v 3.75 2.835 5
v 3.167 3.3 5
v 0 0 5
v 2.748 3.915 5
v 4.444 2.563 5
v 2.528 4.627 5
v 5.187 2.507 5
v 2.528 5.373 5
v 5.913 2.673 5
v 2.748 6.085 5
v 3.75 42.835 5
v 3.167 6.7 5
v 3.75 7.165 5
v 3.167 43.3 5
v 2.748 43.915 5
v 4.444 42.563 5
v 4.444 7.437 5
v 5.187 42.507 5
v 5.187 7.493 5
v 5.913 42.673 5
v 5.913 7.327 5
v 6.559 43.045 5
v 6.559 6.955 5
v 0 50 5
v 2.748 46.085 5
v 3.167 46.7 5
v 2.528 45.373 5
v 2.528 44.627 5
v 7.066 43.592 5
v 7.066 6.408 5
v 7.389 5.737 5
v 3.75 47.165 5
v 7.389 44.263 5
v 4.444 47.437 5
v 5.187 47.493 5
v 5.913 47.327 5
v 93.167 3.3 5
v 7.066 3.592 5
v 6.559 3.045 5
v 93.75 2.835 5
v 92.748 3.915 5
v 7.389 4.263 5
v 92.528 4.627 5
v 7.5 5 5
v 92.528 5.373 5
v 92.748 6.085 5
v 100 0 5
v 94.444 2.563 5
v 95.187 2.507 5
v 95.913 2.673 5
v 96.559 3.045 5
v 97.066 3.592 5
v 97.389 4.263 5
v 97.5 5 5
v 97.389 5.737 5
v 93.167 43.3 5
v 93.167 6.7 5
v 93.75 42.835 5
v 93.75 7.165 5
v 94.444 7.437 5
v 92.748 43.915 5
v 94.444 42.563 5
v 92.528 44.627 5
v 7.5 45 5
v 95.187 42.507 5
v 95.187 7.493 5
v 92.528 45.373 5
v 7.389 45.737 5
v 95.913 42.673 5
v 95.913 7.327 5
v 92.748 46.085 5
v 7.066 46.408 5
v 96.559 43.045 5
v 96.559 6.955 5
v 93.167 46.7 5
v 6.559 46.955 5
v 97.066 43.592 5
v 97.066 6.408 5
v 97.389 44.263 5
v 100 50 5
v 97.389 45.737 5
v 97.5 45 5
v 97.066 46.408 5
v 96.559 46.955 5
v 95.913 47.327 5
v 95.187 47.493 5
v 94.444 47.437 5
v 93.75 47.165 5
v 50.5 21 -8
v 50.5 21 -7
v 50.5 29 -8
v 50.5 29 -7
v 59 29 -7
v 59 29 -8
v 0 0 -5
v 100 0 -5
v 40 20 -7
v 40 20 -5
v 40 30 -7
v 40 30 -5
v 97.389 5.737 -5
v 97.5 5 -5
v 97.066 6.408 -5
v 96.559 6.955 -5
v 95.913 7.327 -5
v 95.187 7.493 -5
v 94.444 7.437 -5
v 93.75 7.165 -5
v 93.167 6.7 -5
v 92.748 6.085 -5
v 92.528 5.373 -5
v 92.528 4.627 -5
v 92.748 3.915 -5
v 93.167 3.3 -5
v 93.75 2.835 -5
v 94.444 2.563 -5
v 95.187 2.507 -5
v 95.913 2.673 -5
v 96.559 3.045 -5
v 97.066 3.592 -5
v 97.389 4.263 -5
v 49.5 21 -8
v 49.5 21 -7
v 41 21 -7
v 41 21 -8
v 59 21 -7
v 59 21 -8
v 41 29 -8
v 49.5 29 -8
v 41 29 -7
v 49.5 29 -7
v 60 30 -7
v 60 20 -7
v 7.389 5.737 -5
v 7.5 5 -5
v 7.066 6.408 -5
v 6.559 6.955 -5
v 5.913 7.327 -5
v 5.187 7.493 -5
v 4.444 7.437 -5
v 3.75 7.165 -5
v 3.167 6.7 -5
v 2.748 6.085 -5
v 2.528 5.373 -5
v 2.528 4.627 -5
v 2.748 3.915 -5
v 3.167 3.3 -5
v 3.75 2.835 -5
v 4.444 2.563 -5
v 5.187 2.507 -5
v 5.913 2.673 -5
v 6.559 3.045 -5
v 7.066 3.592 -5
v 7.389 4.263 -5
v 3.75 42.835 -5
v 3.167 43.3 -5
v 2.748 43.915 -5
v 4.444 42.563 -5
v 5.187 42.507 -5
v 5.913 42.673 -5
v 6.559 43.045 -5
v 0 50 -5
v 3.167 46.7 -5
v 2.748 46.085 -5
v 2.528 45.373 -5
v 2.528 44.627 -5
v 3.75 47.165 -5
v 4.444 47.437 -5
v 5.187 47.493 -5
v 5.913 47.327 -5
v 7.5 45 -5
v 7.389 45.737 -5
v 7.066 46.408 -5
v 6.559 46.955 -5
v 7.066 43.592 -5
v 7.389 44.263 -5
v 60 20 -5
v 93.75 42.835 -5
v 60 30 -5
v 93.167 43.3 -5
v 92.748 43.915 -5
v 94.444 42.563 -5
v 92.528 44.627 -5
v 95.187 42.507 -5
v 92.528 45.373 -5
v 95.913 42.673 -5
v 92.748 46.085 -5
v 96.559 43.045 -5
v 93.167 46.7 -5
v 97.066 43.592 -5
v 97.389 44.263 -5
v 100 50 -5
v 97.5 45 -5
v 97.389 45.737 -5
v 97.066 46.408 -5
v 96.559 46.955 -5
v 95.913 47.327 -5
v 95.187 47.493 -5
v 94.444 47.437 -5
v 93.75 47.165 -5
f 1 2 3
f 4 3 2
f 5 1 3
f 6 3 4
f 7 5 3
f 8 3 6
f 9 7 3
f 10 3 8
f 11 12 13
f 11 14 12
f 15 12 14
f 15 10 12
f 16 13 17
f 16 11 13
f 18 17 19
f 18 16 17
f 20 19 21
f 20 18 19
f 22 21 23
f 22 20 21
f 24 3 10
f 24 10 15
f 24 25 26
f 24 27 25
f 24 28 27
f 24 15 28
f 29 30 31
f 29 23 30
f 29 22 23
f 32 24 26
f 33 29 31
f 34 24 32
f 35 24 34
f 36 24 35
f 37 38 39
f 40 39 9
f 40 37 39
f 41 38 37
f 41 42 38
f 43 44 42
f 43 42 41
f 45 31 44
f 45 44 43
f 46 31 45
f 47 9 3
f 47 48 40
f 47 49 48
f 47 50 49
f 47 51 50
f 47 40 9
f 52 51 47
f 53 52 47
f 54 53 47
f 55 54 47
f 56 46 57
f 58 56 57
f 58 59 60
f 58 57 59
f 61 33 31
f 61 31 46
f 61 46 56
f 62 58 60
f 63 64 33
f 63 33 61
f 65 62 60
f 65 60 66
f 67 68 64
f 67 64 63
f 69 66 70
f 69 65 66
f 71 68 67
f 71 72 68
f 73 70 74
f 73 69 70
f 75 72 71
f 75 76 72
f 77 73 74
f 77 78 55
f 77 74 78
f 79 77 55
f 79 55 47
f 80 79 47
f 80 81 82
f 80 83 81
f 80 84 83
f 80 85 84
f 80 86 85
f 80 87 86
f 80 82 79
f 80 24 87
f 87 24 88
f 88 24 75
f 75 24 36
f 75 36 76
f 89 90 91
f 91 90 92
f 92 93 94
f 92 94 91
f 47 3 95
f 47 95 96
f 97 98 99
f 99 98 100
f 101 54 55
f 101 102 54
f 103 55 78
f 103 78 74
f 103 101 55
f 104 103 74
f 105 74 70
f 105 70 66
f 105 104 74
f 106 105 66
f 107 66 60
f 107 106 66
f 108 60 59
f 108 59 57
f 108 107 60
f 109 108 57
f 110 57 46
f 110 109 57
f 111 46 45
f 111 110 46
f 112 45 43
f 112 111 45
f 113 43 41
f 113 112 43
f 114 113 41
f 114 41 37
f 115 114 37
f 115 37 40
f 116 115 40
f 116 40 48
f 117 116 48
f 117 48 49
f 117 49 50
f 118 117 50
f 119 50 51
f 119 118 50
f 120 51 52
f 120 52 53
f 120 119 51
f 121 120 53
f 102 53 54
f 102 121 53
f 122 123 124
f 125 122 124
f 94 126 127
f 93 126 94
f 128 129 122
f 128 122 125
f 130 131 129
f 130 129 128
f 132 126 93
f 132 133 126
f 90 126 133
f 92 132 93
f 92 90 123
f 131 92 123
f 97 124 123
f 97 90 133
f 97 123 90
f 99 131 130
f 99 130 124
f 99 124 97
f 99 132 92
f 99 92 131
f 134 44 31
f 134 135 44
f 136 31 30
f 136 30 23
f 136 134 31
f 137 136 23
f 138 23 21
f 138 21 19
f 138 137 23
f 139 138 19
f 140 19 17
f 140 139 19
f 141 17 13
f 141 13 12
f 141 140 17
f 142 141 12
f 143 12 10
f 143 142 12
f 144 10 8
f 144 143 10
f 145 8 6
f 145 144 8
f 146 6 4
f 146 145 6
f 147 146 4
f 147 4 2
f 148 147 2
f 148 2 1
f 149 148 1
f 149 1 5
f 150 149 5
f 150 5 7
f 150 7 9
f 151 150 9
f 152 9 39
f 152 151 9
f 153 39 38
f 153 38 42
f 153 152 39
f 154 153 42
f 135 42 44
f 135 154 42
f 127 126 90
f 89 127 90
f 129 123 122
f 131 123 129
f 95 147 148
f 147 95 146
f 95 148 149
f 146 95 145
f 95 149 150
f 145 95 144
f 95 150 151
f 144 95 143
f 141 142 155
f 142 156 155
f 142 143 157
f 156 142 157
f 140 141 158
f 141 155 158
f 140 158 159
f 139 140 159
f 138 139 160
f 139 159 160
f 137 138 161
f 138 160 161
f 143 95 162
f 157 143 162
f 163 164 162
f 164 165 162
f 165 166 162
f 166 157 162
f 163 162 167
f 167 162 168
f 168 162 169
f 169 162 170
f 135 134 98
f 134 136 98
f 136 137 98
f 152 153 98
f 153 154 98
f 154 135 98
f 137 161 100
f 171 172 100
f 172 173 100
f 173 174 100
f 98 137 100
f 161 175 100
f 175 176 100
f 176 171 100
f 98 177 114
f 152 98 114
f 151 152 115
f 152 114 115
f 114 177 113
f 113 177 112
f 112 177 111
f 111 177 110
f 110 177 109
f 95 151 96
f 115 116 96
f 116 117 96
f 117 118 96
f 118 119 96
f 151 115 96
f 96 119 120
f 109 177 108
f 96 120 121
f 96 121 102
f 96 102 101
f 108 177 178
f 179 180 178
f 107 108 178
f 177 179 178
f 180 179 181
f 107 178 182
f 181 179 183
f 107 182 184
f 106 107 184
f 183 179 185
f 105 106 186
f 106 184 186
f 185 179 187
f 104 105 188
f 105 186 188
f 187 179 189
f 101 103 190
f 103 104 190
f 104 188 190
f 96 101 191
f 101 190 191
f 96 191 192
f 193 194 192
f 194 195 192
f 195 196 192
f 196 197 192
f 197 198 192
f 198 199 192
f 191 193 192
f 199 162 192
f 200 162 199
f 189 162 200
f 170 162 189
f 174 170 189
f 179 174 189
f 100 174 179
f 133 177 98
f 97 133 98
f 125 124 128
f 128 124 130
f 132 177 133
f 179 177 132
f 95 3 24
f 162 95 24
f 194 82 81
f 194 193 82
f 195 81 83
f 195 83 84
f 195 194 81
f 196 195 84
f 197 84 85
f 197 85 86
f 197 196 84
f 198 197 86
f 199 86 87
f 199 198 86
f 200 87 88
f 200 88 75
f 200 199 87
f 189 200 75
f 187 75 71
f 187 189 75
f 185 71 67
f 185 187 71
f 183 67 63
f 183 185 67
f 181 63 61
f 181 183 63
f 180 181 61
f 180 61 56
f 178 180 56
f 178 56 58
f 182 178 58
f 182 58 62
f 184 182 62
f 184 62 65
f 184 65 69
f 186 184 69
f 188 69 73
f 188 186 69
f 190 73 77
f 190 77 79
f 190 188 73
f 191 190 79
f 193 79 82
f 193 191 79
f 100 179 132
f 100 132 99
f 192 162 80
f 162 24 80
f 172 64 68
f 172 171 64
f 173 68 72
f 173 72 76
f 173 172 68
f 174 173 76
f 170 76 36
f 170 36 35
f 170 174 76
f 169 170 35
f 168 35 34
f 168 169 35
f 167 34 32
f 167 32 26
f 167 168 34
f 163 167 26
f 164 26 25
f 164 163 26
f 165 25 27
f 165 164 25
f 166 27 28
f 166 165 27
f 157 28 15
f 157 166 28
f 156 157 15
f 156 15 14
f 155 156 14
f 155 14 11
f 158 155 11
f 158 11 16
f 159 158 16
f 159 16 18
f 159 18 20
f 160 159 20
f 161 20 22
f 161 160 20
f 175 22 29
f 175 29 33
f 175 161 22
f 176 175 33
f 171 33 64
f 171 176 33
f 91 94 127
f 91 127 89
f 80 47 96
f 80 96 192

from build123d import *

# Parameters (mm, degrees)
SKETCH1_W           = 100
SKETCH1_H           = 50
SKETCH1_R           = 2.5
BOSS_EXTRUDE1_DEPTH = 5
SKETCH2_W           = 20
SKETCH2_H           = 10
SKETCH2_W_2         = 8.5
SKETCH2_H_2         = 8
BOSS_EXTRUDE2_DEPTH = 2
SKETCH2_3_W         = 8.5
SKETCH2_3_H         = 8
BOSS_EXTRUDE3_DEPTH = 3


with BuildPart() as part:
    # Sketch1 → Boss-Extrude1 (new, symmetric)
    with BuildSketch(Plane.XY):
        with Locations((50, 25)):
            Rectangle(SKETCH1_W, SKETCH1_H)
        with Locations((5, 5)):
            Circle(SKETCH1_R, mode=Mode.SUBTRACT)
        with Locations((5, 45)):
            Circle(SKETCH1_R, mode=Mode.SUBTRACT)
        with Locations((95, 45)):
            Circle(SKETCH1_R, mode=Mode.SUBTRACT)
        with Locations((95, 5)):
            Circle(SKETCH1_R, mode=Mode.SUBTRACT)
    extrude(amount=BOSS_EXTRUDE1_DEPTH, both=True)

    # Sketch2 → Boss-Extrude2 (add)
    with BuildSketch(Plane(origin=(0, 0, -5), x_dir=(-1, 0, 0), z_dir=(0, 0, -1))):
        with Locations((-50, 25)):
            Rectangle(SKETCH2_W, SKETCH2_H)
        with Locations((-54.75, 25)):
            Rectangle(SKETCH2_W_2, SKETCH2_H_2, mode=Mode.SUBTRACT)
        with Locations((-45.25, 25)):
            Rectangle(SKETCH2_W_2, SKETCH2_H_2, mode=Mode.SUBTRACT)
    extrude(amount=BOSS_EXTRUDE2_DEPTH)

    # Sketch2<3> → Boss-Extrude3 (add)
    with BuildSketch(Plane(origin=(0, 0, -5), x_dir=(-1, 0, 0), z_dir=(0, 0, -1))):
        with Locations((-54.75, 25)):
            Rectangle(SKETCH2_3_W, SKETCH2_3_H)
        with Locations((-45.25, 25)):
            Rectangle(SKETCH2_3_W, SKETCH2_3_H)
    extrude(amount=BOSS_EXTRUDE3_DEPTH)


solid = part.part
